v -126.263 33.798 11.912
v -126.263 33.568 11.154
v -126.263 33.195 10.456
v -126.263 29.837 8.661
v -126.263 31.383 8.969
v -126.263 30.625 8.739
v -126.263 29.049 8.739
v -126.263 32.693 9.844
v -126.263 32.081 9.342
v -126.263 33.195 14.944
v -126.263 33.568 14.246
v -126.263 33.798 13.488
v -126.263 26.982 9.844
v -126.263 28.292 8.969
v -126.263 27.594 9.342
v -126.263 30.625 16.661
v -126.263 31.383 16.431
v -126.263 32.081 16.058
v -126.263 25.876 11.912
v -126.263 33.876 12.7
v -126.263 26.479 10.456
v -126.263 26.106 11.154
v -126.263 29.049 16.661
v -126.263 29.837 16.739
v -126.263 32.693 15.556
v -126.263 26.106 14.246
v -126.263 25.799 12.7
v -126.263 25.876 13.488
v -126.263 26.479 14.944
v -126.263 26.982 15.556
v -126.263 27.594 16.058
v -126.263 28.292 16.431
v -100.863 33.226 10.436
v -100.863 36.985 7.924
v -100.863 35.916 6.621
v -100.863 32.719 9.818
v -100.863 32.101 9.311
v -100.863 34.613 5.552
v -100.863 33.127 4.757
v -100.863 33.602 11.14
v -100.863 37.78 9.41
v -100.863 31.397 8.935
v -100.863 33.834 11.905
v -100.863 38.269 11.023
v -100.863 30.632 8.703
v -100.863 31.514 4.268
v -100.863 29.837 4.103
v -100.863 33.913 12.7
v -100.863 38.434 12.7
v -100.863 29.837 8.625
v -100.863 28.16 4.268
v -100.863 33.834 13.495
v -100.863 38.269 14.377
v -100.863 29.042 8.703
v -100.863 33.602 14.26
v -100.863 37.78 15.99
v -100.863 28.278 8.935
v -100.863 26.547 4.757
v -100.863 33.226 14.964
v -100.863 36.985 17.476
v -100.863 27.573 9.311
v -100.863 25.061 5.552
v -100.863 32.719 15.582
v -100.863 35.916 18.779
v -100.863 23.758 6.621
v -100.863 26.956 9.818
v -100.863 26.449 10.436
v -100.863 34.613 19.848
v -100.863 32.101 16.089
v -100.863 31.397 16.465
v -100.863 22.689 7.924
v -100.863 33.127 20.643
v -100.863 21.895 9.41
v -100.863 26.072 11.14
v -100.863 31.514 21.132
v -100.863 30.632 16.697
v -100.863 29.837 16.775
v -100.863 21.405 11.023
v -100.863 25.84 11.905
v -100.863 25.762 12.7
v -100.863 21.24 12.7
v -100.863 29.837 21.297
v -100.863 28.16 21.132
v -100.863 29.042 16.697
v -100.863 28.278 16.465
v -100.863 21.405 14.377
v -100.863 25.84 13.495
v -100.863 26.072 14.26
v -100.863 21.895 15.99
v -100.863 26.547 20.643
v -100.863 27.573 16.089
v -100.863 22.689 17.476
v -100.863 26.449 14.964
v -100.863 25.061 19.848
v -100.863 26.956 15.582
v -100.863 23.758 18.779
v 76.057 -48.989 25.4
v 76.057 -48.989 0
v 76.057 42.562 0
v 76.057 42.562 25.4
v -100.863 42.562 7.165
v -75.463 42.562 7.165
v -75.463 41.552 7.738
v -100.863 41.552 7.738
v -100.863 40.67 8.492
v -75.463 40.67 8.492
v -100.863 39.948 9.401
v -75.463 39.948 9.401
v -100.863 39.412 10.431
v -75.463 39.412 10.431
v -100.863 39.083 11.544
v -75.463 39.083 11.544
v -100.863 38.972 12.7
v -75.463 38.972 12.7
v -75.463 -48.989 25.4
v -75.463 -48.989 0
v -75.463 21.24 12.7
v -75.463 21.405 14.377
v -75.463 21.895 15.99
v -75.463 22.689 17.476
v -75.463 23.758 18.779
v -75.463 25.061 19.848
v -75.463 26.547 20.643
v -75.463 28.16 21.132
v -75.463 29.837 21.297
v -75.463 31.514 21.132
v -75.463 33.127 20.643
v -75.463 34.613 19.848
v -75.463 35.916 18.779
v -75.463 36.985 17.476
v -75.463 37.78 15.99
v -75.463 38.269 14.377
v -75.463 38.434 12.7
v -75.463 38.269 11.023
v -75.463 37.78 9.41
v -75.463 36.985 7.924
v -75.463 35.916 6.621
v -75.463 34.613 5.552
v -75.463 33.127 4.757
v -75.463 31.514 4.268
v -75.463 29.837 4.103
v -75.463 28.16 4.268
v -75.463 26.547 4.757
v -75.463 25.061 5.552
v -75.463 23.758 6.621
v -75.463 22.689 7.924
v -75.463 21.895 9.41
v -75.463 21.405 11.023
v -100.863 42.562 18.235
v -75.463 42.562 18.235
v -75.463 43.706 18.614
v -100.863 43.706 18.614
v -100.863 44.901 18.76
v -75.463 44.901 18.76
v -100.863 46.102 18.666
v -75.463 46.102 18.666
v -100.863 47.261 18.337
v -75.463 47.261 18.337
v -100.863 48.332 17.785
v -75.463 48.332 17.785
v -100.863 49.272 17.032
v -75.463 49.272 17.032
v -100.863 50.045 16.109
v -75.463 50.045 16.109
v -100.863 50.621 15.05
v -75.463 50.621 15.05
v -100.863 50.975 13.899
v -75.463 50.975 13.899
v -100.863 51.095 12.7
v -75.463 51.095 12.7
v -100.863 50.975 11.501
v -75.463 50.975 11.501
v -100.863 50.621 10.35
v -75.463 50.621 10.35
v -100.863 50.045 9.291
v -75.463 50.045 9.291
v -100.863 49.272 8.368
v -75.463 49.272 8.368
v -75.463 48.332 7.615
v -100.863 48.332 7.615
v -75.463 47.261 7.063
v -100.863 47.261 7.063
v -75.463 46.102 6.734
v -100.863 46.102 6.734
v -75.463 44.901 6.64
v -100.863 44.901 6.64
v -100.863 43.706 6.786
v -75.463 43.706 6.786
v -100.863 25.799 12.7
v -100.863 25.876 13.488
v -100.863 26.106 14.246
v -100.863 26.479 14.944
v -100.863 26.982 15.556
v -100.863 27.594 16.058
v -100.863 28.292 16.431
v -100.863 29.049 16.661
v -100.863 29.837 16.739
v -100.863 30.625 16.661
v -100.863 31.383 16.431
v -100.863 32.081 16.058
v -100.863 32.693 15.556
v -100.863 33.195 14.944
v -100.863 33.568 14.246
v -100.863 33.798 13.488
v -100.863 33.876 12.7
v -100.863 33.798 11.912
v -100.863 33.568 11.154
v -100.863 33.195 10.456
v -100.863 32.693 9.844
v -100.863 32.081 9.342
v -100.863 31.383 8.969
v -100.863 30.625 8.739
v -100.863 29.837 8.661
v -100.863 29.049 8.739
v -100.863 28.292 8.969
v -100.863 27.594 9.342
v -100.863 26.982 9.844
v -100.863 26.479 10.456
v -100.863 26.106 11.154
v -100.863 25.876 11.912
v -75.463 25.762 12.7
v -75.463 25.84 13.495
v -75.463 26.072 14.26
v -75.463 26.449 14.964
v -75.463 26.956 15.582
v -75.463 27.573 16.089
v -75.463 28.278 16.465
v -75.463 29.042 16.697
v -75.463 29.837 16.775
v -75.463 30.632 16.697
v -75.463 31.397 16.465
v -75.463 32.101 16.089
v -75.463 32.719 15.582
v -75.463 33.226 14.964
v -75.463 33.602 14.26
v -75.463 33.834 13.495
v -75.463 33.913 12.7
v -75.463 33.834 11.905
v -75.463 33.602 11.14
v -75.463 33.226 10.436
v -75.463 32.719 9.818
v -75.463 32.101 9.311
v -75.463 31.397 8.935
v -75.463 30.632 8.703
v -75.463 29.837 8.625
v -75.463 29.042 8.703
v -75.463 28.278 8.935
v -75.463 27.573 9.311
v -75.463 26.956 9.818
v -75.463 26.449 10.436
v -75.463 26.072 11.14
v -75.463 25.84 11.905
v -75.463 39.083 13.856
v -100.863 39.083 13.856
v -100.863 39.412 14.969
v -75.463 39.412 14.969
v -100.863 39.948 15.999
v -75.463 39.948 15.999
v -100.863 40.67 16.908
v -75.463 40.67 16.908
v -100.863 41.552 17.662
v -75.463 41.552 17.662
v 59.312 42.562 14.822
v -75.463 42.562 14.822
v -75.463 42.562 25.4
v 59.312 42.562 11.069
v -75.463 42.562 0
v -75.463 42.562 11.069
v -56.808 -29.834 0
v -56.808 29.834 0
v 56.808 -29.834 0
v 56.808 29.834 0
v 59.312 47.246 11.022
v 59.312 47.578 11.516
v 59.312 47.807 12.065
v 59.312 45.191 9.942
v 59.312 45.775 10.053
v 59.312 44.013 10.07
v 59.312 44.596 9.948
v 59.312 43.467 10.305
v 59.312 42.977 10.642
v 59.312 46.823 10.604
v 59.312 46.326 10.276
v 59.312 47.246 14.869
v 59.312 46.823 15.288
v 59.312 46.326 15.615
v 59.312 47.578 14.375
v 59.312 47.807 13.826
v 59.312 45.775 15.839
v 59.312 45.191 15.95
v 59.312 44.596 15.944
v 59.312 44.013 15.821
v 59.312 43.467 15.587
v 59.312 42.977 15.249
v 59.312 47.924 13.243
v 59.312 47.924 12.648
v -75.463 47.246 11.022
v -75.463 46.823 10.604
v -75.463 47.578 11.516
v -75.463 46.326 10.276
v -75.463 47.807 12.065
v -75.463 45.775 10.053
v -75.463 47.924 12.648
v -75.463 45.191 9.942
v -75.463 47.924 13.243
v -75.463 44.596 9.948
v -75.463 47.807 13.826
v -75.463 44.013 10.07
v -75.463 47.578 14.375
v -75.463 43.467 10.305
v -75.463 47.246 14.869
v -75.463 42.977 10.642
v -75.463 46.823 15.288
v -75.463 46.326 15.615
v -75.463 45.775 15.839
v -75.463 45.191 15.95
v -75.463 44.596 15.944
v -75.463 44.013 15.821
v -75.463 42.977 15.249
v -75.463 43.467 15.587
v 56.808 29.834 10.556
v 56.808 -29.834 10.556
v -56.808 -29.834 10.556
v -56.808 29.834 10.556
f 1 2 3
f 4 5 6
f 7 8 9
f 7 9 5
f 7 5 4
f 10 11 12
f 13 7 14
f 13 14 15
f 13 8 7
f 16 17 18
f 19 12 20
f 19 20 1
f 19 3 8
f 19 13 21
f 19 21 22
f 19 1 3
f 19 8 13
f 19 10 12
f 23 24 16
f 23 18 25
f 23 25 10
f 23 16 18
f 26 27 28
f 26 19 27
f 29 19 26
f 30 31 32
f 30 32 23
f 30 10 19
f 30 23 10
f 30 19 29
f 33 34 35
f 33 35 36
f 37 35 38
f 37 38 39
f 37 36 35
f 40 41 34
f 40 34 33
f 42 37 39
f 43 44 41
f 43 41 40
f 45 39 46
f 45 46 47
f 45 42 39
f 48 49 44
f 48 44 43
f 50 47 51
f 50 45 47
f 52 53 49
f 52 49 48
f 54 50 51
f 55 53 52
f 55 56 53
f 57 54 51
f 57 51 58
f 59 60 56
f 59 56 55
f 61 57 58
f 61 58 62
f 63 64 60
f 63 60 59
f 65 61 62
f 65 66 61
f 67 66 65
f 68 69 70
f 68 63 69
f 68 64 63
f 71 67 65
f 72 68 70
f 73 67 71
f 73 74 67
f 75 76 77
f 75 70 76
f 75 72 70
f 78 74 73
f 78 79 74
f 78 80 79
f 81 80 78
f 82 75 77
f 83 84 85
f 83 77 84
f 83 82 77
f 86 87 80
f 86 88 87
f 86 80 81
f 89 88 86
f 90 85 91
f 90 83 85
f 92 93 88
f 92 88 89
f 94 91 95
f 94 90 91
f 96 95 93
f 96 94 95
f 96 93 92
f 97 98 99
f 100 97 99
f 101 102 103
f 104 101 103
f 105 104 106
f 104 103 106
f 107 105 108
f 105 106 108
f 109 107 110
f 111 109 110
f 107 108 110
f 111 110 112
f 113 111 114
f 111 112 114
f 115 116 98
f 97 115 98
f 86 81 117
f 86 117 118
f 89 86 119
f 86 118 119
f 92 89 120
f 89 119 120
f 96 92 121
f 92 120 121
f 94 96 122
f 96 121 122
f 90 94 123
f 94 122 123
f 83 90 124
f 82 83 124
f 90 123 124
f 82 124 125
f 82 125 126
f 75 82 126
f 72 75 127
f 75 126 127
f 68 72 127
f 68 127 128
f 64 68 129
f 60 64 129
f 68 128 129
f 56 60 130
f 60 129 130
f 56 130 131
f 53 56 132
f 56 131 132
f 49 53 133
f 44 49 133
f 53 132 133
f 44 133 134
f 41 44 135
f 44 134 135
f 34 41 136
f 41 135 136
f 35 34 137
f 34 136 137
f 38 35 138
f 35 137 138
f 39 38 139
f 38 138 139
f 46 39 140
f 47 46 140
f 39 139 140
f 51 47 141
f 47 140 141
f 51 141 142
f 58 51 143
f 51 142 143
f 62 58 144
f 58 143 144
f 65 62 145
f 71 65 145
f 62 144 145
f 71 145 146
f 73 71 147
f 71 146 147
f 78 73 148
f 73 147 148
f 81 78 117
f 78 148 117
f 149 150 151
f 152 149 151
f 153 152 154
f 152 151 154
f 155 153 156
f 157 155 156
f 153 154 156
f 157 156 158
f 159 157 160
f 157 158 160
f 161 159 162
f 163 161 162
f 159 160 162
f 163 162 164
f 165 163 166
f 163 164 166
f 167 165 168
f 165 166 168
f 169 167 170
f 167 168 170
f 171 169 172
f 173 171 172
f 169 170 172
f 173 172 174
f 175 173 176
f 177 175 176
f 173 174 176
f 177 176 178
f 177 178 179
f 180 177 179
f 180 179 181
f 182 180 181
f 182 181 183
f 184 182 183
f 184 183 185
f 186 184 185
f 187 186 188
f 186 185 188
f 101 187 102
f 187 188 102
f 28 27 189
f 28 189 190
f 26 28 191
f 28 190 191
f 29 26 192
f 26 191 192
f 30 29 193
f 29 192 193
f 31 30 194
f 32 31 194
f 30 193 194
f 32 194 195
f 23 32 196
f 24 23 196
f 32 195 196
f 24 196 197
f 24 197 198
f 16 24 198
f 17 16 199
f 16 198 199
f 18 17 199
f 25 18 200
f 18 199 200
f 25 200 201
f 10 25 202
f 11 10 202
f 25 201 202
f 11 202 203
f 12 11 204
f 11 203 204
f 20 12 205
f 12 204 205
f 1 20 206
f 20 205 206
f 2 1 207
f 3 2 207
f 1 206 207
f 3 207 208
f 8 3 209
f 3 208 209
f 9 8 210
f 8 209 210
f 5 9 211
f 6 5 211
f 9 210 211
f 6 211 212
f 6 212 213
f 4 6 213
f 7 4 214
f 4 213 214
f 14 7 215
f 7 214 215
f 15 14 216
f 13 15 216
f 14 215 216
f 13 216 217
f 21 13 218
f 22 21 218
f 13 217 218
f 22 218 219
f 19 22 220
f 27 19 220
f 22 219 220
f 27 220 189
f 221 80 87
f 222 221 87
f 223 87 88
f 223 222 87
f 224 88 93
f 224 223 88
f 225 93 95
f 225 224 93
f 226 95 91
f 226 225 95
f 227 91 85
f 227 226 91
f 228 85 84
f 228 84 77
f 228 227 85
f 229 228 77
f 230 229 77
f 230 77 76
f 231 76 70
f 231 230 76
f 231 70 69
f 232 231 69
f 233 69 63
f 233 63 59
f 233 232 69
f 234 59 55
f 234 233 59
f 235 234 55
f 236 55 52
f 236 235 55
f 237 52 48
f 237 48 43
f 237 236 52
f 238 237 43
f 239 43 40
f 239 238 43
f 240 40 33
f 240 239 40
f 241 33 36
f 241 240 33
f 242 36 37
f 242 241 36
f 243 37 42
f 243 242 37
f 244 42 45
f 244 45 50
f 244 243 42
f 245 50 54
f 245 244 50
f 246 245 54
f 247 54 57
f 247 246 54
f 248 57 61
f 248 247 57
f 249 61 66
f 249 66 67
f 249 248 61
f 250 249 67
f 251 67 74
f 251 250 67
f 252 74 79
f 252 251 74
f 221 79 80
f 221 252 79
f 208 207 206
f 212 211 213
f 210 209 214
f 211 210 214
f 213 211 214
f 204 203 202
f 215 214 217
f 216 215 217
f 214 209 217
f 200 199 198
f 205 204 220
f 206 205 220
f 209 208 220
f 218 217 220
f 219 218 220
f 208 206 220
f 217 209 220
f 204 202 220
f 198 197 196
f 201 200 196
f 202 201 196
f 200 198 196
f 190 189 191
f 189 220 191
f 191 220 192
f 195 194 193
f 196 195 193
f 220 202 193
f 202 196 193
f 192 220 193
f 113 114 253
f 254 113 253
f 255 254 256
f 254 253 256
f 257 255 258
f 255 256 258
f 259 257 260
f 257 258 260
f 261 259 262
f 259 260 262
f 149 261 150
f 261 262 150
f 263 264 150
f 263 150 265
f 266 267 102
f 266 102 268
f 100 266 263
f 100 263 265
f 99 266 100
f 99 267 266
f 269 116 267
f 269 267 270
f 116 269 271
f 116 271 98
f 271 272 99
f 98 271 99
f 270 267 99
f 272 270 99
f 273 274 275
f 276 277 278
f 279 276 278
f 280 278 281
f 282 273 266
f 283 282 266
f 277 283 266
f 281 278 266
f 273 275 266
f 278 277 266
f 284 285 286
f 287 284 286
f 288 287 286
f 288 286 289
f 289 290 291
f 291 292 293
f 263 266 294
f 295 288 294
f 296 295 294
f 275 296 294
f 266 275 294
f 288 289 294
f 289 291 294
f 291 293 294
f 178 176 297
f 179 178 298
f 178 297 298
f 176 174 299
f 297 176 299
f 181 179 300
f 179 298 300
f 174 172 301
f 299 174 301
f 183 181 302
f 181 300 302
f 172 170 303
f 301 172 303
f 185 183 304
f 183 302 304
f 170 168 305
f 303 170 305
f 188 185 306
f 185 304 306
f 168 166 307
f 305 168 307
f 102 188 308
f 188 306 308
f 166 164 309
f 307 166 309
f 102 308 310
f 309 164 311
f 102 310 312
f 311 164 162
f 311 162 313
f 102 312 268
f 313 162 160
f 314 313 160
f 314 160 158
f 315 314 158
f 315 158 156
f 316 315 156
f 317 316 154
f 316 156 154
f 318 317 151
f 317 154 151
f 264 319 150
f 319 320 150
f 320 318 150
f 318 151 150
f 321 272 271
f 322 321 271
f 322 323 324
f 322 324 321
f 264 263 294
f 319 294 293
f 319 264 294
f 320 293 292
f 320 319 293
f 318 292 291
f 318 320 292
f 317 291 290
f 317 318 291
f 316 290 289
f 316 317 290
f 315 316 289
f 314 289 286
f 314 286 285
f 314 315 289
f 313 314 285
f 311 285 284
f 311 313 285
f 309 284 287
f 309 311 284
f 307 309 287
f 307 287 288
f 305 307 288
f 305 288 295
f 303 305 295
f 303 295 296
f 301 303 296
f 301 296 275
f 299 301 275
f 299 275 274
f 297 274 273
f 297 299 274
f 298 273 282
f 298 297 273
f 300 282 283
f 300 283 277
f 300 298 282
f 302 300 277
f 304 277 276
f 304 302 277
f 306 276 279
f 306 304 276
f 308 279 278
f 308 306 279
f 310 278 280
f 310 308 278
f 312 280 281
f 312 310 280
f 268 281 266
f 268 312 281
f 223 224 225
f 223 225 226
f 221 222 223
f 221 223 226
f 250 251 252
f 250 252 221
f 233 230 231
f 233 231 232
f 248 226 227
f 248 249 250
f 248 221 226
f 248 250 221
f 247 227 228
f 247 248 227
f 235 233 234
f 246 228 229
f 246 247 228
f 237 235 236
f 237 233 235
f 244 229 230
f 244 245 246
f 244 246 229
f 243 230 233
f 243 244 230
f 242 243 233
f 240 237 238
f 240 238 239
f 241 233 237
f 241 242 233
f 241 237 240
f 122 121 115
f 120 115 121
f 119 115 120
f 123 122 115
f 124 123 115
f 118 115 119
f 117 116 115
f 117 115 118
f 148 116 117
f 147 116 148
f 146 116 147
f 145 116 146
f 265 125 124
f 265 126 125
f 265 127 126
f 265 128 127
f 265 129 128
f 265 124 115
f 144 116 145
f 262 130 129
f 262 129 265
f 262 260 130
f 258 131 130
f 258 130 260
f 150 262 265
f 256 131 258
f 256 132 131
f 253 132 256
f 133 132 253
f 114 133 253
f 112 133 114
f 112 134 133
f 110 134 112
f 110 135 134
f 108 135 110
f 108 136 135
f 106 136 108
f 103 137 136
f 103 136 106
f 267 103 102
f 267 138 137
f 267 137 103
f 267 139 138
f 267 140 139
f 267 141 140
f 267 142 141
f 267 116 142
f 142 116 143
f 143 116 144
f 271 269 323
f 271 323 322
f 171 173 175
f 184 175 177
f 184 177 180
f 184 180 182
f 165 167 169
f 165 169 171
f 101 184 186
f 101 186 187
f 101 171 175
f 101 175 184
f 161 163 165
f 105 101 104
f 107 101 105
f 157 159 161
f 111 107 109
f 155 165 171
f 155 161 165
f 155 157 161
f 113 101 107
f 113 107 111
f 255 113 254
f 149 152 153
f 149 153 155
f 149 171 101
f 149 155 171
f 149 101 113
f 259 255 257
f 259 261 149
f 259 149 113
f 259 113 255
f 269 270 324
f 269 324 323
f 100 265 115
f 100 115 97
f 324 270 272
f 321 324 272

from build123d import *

# Parameters (mm, degrees)
F0_W     = 151.5196710825
F0_H     = 91.5514752269
F1_DEPTH = 25.4
F2_W     = 113.6156320572
F2_H     = 59.6670508385
F3_DEPTH = 10.5557646602
F4_R     = 2.4710185826
F4_R_2   = 8.5969736698
F4_R_3   = 4.0753416552
F5_DEPTH = 25.4
F6_R     = 4.038631368
F7_DEPTH = 25.4
F8_R     = 3.0157926106
F9_DEPTH = 160.1748466492


with BuildPart() as f1:
    # F0 (on Top) → F1 (new body)
    with BuildSketch(Plane.XY):
        with Locations((0.2970024943, -3.213506192)):
            Rectangle(F0_W, F0_H)
    extrude(amount=F1_DEPTH)

    # F2 (on face) → F3 (cut)
    with BuildSketch(Plane(origin=(0, 0, 0), x_dir=(1, 0, 0), z_dir=(0, 0, -1))):
        Rectangle(F2_W, F2_H)
    extrude(amount=-F3_DEPTH, mode=Mode.SUBTRACT)

    # F4 (on face) → F5 (join)
    with BuildSketch(Plane(origin=(-75.4628330469, 0, 0), x_dir=(0, -1, 0), z_dir=(-1, 0, 0))):
        with BuildLine():
            Line((-42.5622314215, 18.2348300056), (-42.5622314215, 12.7))
            Line((-42.5622314215, 12.7), (-42.5622314215, 7.1651699944))
            ThreePointArc((-42.5622314215, 7.1651699944), (-39.9480731069, 9.4013257281), (-38.9718742504, 12.7))
            ThreePointArc((-38.9718742504, 12.7), (-39.9480731069, 15.9986742719), (-42.5622314215, 18.2348300056))
        make_face()
        with BuildLine():
            Line((-42.5622314215, 7.1651699944), (-42.5622314215, 12.7))
            Line((-42.5622314215, 12.7), (-42.5622314215, 18.2348300056))
            ThreePointArc((-42.5622314215, 18.2348300056), (-51.0946257577, 12.7), (-42.5622314215, 7.1651699944))
        make_face()
        with Locations((-45.0332500041, 12.7)):
            Circle(F4_R, mode=Mode.SUBTRACT)
        with Locations((-29.8372581601, 12.7)):
            Circle(F4_R_2)
        with Locations((-29.8372581601, 12.7)):
            Circle(F4_R_3, mode=Mode.SUBTRACT)
    extrude(amount=F5_DEPTH)

    # F8 (on face) → F9 (join)
    with BuildSketch(Plane(origin=(-100.8628330469, 0, 0), x_dir=(0, -1, 0), z_dir=(-1, 0, 0))):
        with Locations((-44.9228733778, 12.9456110299)):
            Circle(F8_R)
    extrude(amount=-F9_DEPTH)


with BuildPart() as f7:
    # F6 (on face) → F7 (new body)
    with BuildSketch(Plane(origin=(-100.8628330469, 0, 0), x_dir=(0, -1, 0), z_dir=(-1, 0, 0))):
        with Locations((-29.8372581601, 12.7)):
            Circle(F6_R)
    extrude(amount=F7_DEPTH)


solid = Compound([f1.part, f7.part])
